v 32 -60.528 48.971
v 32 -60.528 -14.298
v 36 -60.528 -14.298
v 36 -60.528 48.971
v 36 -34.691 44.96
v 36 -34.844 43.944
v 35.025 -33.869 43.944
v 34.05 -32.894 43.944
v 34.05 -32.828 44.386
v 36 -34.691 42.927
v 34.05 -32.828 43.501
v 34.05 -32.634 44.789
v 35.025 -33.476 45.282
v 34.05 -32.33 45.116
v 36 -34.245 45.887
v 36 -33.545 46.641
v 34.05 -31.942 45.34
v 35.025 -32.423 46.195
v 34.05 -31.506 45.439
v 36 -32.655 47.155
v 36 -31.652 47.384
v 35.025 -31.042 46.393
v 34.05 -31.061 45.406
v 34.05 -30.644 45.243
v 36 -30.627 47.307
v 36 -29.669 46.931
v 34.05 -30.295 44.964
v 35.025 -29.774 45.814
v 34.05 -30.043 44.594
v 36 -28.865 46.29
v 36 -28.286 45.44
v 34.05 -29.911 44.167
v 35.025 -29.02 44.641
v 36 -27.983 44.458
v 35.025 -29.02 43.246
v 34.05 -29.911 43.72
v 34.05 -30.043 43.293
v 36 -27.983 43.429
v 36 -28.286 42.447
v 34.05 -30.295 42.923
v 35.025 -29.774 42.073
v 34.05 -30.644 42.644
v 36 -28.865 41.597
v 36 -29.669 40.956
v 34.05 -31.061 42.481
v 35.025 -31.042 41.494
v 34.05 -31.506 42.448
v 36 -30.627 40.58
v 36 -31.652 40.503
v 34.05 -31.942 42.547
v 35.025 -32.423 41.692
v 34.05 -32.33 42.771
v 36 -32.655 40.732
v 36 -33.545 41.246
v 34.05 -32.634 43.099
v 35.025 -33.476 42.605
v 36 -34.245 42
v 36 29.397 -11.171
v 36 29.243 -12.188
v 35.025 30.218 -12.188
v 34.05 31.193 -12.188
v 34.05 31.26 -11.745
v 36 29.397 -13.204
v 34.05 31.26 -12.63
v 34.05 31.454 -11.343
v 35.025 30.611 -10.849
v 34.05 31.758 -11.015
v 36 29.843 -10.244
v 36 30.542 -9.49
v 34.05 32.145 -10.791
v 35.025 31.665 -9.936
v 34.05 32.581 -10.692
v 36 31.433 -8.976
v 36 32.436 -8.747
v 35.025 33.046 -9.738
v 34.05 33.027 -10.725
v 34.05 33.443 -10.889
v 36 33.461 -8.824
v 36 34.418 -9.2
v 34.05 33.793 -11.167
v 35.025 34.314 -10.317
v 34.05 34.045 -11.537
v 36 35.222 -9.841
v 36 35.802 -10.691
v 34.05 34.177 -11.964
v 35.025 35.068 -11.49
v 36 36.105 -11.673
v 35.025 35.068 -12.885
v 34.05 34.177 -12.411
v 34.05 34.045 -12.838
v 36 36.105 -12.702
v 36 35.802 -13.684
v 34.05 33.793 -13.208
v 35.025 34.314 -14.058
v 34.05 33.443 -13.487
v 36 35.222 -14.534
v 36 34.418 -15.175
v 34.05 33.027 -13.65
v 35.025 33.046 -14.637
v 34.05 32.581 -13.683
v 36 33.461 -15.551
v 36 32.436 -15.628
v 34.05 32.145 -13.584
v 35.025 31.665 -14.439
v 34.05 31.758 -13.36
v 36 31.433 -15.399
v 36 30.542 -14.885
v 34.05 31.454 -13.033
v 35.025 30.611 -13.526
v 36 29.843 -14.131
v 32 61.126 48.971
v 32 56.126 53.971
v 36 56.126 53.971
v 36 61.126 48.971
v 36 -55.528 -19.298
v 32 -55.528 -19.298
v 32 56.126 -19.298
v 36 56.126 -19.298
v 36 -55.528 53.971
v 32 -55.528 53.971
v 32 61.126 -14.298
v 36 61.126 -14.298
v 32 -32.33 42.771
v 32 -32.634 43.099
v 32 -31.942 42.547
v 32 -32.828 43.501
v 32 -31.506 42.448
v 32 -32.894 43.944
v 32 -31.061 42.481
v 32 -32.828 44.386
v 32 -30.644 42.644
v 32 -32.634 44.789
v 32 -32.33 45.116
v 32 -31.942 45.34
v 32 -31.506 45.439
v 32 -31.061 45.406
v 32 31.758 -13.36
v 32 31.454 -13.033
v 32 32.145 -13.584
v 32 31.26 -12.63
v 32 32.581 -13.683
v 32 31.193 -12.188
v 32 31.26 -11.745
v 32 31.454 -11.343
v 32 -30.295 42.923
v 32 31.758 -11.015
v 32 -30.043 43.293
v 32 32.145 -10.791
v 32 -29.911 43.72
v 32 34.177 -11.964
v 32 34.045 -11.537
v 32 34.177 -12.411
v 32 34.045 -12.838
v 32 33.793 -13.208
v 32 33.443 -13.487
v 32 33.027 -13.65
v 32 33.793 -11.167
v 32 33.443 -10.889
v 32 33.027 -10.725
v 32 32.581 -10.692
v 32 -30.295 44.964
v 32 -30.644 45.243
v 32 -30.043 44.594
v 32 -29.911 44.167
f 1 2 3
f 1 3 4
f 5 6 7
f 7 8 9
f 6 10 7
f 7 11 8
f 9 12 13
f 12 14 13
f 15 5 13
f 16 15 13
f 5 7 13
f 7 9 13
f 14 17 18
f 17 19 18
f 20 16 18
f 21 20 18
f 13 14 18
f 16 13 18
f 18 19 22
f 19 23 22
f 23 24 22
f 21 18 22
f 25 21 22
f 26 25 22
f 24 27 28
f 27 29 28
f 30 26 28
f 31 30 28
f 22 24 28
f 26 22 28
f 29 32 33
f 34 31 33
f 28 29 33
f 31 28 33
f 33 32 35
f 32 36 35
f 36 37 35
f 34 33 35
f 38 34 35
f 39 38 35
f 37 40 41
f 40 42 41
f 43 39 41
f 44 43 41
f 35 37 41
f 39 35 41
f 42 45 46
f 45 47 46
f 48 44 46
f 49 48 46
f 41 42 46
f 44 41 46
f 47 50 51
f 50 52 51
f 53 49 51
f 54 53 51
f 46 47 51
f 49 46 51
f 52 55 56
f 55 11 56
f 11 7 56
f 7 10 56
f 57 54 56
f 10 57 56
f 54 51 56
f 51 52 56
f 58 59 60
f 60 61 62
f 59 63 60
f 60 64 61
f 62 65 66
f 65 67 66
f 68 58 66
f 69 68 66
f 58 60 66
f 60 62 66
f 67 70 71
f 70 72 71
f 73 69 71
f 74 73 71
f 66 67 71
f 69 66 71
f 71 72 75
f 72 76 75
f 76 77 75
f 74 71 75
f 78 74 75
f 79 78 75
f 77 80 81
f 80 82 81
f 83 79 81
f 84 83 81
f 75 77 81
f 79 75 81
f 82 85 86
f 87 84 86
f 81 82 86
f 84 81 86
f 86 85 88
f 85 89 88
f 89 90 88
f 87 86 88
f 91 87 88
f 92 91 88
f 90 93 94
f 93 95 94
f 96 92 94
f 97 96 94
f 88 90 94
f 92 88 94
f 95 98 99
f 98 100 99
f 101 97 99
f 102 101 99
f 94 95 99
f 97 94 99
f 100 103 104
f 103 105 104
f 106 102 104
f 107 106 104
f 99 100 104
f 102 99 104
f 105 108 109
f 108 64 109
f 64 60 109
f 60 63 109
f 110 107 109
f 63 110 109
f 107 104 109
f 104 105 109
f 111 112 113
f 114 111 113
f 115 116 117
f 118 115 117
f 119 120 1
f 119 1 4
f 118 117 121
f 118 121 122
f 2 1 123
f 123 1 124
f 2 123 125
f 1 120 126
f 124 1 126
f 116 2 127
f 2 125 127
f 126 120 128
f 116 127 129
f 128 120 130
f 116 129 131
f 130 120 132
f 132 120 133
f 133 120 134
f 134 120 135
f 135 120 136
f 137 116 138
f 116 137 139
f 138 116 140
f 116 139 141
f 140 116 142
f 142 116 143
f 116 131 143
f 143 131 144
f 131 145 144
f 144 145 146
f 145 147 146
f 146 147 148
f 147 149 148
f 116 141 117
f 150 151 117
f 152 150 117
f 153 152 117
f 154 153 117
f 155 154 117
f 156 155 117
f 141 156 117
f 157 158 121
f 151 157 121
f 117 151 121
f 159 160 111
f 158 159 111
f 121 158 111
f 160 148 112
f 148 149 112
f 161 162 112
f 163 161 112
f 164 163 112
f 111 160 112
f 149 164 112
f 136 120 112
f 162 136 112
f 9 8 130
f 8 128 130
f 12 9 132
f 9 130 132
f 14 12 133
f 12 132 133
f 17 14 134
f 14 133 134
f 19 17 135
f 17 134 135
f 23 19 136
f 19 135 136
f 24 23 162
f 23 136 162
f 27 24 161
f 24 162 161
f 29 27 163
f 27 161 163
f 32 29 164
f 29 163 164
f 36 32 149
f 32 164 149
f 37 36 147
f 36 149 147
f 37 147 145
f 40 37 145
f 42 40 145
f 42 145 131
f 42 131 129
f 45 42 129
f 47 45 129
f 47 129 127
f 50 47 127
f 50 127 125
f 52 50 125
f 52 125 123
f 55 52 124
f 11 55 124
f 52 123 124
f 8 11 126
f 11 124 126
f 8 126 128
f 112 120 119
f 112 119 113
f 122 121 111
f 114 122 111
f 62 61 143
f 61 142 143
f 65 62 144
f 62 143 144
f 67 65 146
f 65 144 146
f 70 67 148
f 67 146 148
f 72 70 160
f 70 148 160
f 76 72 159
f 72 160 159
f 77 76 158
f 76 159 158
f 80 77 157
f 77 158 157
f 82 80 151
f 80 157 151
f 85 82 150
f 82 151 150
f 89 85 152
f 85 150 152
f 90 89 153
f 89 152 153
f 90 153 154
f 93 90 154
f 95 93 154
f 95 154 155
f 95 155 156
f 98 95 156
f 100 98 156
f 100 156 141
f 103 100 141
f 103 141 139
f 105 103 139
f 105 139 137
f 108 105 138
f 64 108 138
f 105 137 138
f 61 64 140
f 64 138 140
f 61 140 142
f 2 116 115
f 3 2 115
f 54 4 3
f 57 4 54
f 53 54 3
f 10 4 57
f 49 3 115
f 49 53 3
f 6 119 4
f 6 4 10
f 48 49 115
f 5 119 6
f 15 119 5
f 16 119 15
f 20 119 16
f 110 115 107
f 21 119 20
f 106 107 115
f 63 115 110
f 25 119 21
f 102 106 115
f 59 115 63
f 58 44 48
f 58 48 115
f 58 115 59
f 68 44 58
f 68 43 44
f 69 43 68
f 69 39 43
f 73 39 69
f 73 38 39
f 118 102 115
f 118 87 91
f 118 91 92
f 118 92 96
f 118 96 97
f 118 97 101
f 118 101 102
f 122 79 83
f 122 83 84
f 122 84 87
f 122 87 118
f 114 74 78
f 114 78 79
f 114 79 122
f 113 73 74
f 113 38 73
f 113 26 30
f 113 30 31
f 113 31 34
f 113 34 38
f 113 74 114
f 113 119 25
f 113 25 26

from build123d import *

# Parameters (mm, degrees)
SKETCH011_W      = 121.654072
SKETCH011_H      = 73.26893
PAD009_DEPTH     = 4
HOLE_D           = 3
HOLE_DEPTH       = 25
HOLE_CSINK_D     = 6.9
HOLE_CSINK_ANGLE = 90
CHAMFER_SIZE     = 5


with BuildPart() as part:
    # Sketch011 → Pad009 (new body)
    with BuildSketch(Plane.YZ):
        with Locations((0.298689, 17.336089)):
            Rectangle(SKETCH011_W, SKETCH011_H)
    extrude(amount=PAD009_DEPTH)

    # Hole
    with Locations(Plane.YZ.offset(4)):
        with Locations((-31.394375, 43.94352), (32.693371, -12.187573)):
            CounterSinkHole(HOLE_D / 2, HOLE_CSINK_D / 2, depth=HOLE_DEPTH, counter_sink_angle=HOLE_CSINK_ANGLE)

    # Chamfer
    chamfer_edges = [part.edges().sort_by_distance(p)[0] for p in [
        (2, -60.528347, 53.970554),
        (2, 61.125725, 53.970554),
        (2, -60.528347, -19.298376),
        (2, 61.125725, -19.298376),
    ]]
    chamfer(chamfer_edges, length=CHAMFER_SIZE)


with BuildPart() as part_1:
    # Body004 placement: moved
    add(part.part.moved(Location((32, 0, 0))))


solid = part_1.part
